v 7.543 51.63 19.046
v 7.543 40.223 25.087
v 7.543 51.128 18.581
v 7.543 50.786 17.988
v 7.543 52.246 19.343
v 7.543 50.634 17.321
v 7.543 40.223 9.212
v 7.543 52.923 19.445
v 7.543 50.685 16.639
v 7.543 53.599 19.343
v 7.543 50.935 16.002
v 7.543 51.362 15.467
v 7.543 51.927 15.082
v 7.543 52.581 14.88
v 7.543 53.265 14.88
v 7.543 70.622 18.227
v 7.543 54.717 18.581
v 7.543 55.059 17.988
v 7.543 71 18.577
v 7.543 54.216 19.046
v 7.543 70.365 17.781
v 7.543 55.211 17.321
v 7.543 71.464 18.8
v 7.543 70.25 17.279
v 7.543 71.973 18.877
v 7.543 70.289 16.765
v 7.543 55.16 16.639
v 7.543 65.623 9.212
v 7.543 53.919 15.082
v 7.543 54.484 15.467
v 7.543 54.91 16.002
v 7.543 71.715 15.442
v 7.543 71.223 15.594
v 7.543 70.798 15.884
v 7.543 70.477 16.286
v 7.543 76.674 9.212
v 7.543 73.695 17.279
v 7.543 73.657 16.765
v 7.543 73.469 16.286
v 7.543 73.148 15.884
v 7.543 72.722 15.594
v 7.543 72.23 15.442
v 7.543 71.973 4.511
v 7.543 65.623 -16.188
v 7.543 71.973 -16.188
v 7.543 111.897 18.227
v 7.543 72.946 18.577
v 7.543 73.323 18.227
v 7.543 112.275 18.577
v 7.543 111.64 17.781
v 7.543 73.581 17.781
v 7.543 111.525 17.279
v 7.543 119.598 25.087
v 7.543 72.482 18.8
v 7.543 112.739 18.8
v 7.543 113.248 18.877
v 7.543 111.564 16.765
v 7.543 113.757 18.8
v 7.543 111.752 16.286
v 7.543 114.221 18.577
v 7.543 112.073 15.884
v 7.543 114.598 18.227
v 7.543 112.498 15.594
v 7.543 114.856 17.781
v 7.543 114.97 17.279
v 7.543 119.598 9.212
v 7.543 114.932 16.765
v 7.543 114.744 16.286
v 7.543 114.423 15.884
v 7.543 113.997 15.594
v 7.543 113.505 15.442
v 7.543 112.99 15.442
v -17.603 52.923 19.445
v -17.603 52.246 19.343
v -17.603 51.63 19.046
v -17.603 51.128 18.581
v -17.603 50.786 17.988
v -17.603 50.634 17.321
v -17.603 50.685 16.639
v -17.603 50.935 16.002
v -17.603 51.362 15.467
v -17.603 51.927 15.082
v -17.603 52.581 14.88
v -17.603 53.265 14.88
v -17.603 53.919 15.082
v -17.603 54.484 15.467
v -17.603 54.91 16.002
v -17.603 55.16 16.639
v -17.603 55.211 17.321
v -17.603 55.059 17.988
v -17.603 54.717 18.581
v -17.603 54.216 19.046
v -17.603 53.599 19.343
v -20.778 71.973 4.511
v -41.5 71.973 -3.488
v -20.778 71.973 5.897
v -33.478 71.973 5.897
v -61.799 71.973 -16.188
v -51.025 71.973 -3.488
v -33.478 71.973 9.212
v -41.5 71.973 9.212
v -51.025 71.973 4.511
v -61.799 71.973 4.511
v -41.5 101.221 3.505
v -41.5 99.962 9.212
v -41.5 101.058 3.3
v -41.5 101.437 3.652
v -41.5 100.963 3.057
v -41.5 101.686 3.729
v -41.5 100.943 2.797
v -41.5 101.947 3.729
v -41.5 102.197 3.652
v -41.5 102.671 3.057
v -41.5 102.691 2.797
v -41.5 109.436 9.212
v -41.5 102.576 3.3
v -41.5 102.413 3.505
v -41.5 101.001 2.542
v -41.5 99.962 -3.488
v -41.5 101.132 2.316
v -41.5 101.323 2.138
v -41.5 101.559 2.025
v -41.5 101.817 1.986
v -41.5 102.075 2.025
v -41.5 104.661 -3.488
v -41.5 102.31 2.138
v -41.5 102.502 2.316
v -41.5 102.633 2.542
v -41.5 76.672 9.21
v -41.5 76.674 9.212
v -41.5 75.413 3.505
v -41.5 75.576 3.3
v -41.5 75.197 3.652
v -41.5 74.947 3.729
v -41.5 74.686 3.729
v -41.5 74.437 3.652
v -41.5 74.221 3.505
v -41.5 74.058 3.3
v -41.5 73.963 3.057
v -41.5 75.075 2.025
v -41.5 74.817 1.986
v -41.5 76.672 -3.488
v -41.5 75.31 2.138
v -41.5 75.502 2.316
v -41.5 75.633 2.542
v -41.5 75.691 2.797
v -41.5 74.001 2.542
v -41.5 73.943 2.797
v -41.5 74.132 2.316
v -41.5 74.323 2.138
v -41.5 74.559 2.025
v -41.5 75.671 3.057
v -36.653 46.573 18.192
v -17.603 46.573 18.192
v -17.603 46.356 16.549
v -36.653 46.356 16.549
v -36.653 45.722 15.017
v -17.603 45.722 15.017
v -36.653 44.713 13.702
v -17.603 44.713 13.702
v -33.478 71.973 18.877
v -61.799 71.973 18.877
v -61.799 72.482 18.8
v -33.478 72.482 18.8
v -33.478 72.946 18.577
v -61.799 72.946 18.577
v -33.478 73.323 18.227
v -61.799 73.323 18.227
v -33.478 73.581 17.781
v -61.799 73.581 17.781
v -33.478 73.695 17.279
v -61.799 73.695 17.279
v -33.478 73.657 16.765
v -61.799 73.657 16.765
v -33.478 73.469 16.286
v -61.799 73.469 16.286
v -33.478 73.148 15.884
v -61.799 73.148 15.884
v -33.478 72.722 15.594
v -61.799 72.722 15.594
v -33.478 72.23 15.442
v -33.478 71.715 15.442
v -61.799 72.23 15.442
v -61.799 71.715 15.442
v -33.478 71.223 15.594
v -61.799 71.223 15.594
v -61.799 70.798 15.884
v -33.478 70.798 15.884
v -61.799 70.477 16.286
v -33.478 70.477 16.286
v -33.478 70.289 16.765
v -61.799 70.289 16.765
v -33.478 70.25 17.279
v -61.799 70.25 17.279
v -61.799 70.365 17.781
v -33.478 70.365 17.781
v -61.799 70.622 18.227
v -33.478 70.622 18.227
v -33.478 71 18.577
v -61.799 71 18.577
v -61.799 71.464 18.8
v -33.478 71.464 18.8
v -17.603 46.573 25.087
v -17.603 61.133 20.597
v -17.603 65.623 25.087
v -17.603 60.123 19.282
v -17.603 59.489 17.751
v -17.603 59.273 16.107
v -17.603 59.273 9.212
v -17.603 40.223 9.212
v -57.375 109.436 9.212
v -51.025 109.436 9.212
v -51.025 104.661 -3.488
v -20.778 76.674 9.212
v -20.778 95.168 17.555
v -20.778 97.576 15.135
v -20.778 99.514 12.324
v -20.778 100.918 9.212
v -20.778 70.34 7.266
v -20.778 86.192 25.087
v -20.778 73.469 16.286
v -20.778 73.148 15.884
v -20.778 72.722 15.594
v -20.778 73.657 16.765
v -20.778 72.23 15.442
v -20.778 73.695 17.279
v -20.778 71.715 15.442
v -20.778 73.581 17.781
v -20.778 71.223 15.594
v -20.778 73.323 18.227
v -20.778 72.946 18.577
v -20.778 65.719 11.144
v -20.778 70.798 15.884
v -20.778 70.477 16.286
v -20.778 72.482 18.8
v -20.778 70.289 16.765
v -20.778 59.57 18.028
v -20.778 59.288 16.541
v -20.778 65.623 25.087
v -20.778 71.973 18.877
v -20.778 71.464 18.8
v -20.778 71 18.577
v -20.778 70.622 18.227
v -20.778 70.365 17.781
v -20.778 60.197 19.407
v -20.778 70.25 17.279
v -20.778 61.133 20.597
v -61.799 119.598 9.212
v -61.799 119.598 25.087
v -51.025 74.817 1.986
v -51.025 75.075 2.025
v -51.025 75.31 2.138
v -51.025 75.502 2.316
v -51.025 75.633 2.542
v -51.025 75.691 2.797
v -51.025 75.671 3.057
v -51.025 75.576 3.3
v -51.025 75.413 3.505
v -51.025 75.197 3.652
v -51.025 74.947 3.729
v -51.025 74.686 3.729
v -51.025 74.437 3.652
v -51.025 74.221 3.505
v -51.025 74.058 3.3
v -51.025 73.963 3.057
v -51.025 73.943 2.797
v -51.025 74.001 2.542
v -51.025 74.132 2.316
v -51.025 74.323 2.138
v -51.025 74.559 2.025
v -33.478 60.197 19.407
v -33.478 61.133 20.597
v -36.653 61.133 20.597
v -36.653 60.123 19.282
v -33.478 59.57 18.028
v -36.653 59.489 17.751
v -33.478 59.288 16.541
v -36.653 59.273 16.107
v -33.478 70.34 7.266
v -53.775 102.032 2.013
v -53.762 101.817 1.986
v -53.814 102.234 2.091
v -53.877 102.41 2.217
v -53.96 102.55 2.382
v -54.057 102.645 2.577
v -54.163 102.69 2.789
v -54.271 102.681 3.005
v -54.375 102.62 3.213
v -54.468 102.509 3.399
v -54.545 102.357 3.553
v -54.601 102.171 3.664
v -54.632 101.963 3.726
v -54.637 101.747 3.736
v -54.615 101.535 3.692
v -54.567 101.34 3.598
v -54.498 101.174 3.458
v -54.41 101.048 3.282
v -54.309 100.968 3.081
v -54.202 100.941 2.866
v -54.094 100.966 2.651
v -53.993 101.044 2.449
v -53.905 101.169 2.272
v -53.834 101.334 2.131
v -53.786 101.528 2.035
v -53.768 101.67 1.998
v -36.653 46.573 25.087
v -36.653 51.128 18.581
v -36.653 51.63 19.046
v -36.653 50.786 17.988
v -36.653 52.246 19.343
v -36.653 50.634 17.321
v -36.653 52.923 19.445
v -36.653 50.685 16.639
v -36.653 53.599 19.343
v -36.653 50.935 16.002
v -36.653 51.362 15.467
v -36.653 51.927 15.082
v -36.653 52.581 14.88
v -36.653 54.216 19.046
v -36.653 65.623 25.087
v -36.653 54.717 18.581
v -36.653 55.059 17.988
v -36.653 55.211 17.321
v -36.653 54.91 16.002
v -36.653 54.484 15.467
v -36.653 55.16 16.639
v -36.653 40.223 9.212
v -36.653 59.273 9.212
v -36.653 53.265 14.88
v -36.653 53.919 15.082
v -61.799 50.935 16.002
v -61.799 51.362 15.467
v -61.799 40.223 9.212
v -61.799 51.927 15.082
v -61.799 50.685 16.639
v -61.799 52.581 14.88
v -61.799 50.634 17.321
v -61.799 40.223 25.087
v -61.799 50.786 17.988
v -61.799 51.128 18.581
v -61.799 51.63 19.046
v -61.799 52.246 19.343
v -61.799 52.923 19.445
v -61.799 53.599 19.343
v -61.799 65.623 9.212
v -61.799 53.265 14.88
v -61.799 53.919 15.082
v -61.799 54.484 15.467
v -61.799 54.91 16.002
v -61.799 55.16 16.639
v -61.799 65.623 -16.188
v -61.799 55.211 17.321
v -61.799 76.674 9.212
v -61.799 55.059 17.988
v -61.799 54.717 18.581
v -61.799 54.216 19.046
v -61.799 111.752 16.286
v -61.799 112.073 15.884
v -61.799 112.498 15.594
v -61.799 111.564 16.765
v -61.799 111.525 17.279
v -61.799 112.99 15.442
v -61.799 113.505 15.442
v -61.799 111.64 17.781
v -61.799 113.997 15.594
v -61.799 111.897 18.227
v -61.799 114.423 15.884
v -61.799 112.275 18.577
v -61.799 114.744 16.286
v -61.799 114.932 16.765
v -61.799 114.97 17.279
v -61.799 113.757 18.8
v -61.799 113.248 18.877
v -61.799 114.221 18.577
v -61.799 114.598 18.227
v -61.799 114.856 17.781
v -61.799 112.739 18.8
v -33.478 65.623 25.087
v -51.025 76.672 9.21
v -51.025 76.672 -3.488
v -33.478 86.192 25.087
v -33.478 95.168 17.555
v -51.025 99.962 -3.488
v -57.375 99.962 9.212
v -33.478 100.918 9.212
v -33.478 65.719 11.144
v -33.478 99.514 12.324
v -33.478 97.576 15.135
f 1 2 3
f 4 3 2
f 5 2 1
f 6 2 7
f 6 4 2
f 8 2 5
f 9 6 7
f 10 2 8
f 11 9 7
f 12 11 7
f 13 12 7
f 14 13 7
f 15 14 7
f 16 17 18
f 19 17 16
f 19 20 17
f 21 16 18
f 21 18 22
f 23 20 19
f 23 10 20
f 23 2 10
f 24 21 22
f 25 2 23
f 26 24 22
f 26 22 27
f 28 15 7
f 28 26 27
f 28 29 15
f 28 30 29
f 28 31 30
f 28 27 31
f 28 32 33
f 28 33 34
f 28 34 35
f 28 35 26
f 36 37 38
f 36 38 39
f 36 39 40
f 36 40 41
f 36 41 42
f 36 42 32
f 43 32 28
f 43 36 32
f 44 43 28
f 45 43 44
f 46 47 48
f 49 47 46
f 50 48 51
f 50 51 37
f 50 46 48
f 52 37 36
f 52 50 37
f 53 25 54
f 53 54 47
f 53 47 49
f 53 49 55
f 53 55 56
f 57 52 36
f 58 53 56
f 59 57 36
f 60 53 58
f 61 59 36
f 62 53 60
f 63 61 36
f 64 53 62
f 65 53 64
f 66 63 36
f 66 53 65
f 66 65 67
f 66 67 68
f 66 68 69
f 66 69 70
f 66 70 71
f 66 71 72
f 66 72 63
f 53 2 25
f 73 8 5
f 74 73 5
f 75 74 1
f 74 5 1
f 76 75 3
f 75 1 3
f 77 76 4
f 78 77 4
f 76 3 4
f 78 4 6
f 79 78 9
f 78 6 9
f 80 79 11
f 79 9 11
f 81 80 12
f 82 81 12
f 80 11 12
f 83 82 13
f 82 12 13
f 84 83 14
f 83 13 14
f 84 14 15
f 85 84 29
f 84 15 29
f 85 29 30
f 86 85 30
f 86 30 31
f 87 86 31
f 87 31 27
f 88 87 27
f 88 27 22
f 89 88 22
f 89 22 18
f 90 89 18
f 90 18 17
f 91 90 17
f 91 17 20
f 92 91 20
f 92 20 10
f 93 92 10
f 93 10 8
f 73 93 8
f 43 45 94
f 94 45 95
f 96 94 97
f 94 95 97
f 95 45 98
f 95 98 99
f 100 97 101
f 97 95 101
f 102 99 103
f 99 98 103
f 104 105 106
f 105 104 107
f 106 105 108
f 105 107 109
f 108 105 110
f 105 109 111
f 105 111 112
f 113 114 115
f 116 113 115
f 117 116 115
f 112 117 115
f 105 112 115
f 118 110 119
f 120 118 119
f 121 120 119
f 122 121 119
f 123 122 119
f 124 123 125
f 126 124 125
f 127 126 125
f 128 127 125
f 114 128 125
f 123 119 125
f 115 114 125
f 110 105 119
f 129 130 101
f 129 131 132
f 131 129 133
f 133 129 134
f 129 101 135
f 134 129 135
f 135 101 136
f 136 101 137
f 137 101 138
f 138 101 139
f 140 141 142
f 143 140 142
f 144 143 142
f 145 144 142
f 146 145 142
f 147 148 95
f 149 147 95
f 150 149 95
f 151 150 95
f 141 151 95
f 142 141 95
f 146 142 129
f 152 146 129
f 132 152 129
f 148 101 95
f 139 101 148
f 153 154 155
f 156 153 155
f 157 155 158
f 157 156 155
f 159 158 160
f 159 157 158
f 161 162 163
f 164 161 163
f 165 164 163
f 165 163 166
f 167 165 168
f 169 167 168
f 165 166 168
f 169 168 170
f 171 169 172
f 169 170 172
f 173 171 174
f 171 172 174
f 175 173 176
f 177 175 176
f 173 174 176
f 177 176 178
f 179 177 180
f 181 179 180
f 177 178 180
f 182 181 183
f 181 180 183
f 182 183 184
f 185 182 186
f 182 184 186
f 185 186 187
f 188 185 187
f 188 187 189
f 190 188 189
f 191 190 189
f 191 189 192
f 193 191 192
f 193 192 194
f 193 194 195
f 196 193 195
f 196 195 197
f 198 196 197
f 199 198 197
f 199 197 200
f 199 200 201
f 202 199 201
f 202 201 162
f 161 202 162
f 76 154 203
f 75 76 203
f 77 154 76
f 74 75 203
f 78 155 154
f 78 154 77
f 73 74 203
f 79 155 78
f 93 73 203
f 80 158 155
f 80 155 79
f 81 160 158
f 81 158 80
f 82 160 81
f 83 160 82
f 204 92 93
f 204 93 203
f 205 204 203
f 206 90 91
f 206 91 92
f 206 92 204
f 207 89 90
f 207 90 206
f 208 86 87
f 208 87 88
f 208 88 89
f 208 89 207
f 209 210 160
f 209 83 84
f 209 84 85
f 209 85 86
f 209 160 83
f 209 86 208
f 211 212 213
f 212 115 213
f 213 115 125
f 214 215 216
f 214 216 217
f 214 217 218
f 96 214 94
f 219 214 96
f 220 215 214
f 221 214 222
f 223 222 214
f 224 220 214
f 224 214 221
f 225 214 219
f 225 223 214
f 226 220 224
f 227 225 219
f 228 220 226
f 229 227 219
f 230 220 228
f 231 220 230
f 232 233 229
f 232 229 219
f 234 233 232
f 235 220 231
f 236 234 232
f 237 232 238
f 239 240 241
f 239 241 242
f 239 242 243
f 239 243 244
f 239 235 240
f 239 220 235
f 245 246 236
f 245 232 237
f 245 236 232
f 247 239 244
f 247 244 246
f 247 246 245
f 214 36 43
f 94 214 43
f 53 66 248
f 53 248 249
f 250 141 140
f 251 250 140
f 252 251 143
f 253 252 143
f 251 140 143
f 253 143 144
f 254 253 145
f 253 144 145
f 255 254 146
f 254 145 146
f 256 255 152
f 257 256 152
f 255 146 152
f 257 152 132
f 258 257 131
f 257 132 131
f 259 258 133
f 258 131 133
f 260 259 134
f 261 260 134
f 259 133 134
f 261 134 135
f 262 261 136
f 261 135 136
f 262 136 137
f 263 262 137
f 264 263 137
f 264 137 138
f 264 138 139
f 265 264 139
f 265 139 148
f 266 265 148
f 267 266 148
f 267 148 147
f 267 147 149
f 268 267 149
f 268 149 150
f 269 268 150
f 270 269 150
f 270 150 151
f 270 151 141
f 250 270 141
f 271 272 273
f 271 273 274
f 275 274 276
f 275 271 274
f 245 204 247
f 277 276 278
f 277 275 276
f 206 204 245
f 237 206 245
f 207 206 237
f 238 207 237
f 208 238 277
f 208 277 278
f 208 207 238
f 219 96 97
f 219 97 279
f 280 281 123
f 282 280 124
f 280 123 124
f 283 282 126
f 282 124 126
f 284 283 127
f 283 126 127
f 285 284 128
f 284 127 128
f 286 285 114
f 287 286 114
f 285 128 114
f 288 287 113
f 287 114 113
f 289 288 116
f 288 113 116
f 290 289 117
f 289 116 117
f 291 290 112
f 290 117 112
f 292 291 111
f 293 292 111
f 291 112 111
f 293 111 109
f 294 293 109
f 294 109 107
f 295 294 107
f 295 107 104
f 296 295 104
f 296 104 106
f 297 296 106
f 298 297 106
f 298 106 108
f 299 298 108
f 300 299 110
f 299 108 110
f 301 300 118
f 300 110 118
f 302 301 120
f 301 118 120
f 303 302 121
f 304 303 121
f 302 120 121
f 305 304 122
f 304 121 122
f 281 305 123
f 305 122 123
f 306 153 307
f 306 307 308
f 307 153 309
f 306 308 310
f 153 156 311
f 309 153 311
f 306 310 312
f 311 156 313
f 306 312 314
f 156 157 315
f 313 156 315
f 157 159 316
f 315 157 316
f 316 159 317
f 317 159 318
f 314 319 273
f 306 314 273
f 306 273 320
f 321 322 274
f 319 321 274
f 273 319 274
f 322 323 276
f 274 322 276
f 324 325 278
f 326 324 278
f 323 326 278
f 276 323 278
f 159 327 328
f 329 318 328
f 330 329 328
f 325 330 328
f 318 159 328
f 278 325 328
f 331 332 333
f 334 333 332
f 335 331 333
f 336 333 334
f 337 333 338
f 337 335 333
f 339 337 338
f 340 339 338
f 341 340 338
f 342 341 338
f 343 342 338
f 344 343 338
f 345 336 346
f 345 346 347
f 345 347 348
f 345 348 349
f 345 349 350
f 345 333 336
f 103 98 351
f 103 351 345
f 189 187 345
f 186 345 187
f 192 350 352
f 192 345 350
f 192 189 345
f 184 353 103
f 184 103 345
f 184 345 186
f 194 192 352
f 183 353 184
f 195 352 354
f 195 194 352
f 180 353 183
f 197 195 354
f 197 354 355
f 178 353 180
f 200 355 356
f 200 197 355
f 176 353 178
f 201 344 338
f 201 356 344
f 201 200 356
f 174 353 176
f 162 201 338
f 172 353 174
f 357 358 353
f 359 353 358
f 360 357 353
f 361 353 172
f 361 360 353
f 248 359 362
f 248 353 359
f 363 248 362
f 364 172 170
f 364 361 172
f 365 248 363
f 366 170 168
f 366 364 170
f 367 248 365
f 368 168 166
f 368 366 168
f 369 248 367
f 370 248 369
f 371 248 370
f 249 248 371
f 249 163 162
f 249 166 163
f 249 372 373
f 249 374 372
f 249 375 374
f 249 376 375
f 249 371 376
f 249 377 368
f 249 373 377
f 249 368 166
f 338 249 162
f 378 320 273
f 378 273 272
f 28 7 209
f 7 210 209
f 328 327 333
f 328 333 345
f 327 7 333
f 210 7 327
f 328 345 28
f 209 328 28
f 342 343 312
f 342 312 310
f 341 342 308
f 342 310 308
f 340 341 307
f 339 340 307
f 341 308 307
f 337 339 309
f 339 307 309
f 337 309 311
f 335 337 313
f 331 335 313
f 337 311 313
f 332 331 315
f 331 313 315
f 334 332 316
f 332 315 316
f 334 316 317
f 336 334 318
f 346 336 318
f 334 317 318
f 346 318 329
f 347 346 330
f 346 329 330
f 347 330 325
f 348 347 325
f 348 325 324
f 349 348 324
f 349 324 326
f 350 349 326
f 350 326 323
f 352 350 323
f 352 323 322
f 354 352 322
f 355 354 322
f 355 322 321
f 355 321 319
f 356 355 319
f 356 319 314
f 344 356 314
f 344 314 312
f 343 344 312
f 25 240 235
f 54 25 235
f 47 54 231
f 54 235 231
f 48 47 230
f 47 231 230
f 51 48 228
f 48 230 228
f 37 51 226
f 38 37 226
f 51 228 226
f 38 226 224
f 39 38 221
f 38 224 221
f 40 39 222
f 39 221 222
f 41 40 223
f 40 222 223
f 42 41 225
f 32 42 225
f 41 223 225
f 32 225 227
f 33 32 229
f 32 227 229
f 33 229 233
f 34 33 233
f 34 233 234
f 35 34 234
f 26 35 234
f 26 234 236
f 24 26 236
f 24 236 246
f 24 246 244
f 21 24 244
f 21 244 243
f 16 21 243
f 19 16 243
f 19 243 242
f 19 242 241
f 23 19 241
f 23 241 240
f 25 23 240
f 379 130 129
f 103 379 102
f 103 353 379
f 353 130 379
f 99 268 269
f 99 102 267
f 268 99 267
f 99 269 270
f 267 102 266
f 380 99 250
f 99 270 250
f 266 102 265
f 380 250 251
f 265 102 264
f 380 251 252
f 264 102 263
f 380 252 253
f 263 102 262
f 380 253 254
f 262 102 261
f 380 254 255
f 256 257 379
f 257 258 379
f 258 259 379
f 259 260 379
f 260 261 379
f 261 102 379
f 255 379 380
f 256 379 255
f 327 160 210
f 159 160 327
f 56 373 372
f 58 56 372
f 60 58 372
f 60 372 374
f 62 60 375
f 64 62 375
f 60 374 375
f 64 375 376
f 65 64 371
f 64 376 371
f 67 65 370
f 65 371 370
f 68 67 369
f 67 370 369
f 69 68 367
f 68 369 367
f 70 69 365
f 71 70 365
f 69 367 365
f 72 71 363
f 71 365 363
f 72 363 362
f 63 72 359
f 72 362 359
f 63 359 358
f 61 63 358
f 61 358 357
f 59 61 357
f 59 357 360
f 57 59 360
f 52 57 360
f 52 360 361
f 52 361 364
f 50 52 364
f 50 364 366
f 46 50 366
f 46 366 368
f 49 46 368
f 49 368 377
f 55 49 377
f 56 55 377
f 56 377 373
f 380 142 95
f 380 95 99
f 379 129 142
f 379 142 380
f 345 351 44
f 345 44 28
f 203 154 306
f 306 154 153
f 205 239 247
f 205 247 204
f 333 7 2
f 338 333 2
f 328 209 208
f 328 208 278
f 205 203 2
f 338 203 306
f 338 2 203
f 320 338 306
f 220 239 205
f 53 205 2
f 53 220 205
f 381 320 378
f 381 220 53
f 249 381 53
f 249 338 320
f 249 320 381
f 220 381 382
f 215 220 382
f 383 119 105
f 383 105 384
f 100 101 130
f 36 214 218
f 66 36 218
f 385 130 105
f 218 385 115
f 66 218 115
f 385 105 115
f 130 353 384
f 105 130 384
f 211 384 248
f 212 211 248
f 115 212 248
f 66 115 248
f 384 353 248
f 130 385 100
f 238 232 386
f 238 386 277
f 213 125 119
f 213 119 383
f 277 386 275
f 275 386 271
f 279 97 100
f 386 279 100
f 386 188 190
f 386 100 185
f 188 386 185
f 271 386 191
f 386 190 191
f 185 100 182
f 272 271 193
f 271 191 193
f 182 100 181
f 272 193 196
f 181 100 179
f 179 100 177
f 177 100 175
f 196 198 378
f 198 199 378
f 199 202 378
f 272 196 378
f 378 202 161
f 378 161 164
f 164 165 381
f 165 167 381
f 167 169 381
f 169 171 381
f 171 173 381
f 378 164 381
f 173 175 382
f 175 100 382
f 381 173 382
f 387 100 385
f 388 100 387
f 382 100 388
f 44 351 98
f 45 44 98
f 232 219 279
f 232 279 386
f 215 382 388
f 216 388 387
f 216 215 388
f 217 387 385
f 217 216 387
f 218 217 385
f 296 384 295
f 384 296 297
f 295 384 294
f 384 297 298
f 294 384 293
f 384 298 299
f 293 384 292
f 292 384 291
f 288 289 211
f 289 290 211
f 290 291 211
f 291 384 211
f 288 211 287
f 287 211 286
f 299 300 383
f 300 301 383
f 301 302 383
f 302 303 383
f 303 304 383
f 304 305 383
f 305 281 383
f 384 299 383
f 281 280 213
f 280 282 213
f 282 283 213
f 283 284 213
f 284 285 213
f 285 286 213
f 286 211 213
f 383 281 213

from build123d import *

# Parameters (mm, degrees)
SKETCH2_W               = 15.875
SKETCH2_H               = 79.375
SKETCH2_R               = 1.7272
SKETCH2_W_2             = 25.4
SKETCH2_H_2             = 6.35
BOSS_EXTRUDE1_DEPTH     = 69.85
SKETCH3_W               = 19.05
SKETCH3_H               = 12.7
CUT_EXTRUDE1_DEPTH      = 127
SKETCH4_R               = 2.2950679
CUT_EXTRUDE2_DEPTH      = 127
CHAMFER1_SIZE           = 6.35
FILLET2_R               = 6.35
CUT_EXTRUDE3_DEPTH      = 6.35
CUT_EXTRUDE3_DEPTH_BACK = 6.35
SKETCH8_R               = 2.4
SKETCH10_W              = 9.525
SKETCH10_H              = 4.699
BOSS_EXTRUDE2_DEPTH     = 12.7
SKETCH12_R              = 0.8763
CUT_EXTRUDE4_DEPTH      = 132.769283049
CHAMFER2_SIZE           = 4.7752
CHAMFER2_SIZE_2         = 12.7
CHAMFER3_SIZE           = 4.70154
CHAMFER4_SIZE           = 6.35
CHAMFER4_SIZE_2         = 12.7
CUT_EXTRUDE5_DEPTH      = 0.254
CUT_EXTRUDE6_DEPTH      = 0.254


# Some blends are built 0.0001 mm under size
with BuildPart() as part:
    # Sketch2 → Boss-Extrude1 (new body)
    # profile 1 of 2: a face of its own
    with BuildSketch(Plane.ZY.offset(62.053242547)):
        with Locations((17.149745439, 79.910239505)):
            Rectangle(SKETCH2_W, SKETCH2_H)
        with Locations((17.149745439, 113.247739505)):
            Circle(SKETCH2_R, mode=Mode.SUBTRACT)
        with Locations((17.149745439, 71.972739505)):
            Circle(SKETCH2_R, mode=Mode.SUBTRACT)
    # profile 2 of 2: a face of its own
    with BuildSketch(Plane.ZY.offset(62.053242547)):
        with Locations((-3.487754561, 68.797739505)):
            Rectangle(SKETCH2_W_2, SKETCH2_H_2)
    extrude(amount=-BOSS_EXTRUDE1_DEPTH)

    # Sketch3 → Cut-Extrude1 (cut)
    with BuildSketch(Plane(origin=(0, 0, 9.212245439), x_dir=(-1, 0, 0), z_dir=(0, 0, -1))):
        with Locations((27.128242547, 52.922739505)):
            Rectangle(SKETCH3_W, SKETCH3_H)
    extrude(amount=-CUT_EXTRUDE1_DEPTH, mode=Mode.SUBTRACT)

    # Sketch4 → Cut-Extrude2 (cut)
    with BuildSketch(Plane(origin=(7.796757453, 0, 0), x_dir=(0, 0, -1), z_dir=(1, 0, 0))):
        with Locations(Location((-17.149745439, 52.922739505, 0), (0, 0, 180))):
            Circle(SKETCH4_R)
    extrude(amount=-CUT_EXTRUDE2_DEPTH, mode=Mode.SUBTRACT)

    # Chamfer1
    chamfer1_edges = [part.edges().sort_by_distance(p)[0] for p in [
        (-27.128242547, 59.272739505, 25.087245439),
        (-27.128242547, 46.572739505, 9.212245439),
    ]]
    chamfer(chamfer1_edges, length=CHAMFER1_SIZE - 0.0001)  # a hair under: the kernel refuses the full size

    # Fillet2
    fillet2_edges = [part.edges().sort_by_distance(p)[0] for p in [
        (-27.128242547, 59.272739505, 18.737345439),
        (-27.128242547, 46.572739505, 15.562145439),
    ]]
    fillet(fillet2_edges, radius=FILLET2_R)

    # Sketch8 → Cut-Extrude3 (cut, two sides: drawn at the far end of the back side and taken through both)
    # profile 1 of 5: a face of its own
    with BuildSketch(Plane(origin=(-27.128242547, 59.272739505, 33.482952844), x_dir=(0, 0, 1), z_dir=(-1, 0, 0)).offset(-CUT_EXTRUDE3_DEPTH_BACK)):
        with BuildLine():
            Line((-7.077924175, -7.789561181), (-20.085542155, 7.712314277))
            ThreePointArc((-20.085542155, 7.712314277), (-21.190808514, 7.041102183), (-22.339064084, 6.446418612))
            Line((-22.339064084, 6.446418612), (-9.023677061, -9.422241709))
            Line((-9.023677061, -9.422241709), (-7.077924175, -7.789561181))
        make_face()
    # profile 2 of 5: a face of its own
    with BuildSketch(Plane(origin=(-27.128242547, 59.272739505, 33.482952844), x_dir=(0, 0, 1), z_dir=(-1, 0, 0)).offset(-CUT_EXTRUDE3_DEPTH_BACK)):
        with BuildLine():
            Line((-20.085542155, 7.712314277), (-24.270707405, 12.7))
            Line((-24.270707405, 12.7), (-26.21646029, 11.067319471))
            Line((-26.21646029, 11.067319471), (-22.339064084, 6.446418612))
            ThreePointArc((-22.339064084, 6.446418612), (-21.190808514, 7.041102183), (-20.085542155, 7.712314277))
        make_face()
    # profile 3 of 5: a face of its own
    with BuildSketch(Plane(origin=(-27.128242547, 59.272739505, 33.482952844), x_dir=(0, 0, 1), z_dir=(-1, 0, 0)).offset(-CUT_EXTRUDE3_DEPTH_BACK)):
        Polygon((-26.21646029, 11.067319471), (-24.270707405, 12.7), (-27.58644192, 12.7), align=None)
    # profile 4 of 5: a face of its own
    with BuildSketch(Plane(origin=(-27.128242547, 59.272739505, 33.482952844), x_dir=(0, 0, 1), z_dir=(-1, 0, 0)).offset(-CUT_EXTRUDE3_DEPTH_BACK)):
        with BuildLine():
            ThreePointArc((-11.470707405, 23.65), (-13.762240918, 14.591506693), (-20.085542155, 7.712314277))
            Line((-20.085542155, 7.712314277), (-7.077924175, -7.789561181))
            Line((-7.077924175, -7.789561181), (9.239394359, 5.902294783))
            Line((9.239394359, 5.902294783), (-15.927560764, 35.895103965))
            ThreePointArc((-15.927560764, 35.895103965), (-12.619562979, 30.16548373), (-11.470707405, 23.65))
        make_face()
    # profile 5 of 5: a face of its own
    with BuildSketch(Plane(origin=(-27.128242547, 59.272739505, 33.482952844), x_dir=(0, 0, 1), z_dir=(-1, 0, 0)).offset(-CUT_EXTRUDE3_DEPTH_BACK)):
        with BuildLine():
            Line((-27.58644192, 12.7), (-24.270707405, 12.7))
            Line((-24.270707405, 12.7), (-20.085542155, 7.712314277))
            ThreePointArc((-20.085542155, 7.712314277), (-13.762240918, 14.591506693), (-11.470707405, 23.65))
            ThreePointArc((-11.470707405, 23.65), (-12.619562979, 30.16548373), (-15.927560764, 35.895103965))
            ThreePointArc((-15.927560764, 35.895103965), (-42.128931765, 38.754688915), (-46.109164673, 12.7))
            Line((-46.109164673, 12.7), (-27.58644192, 12.7))
        make_face()
        with Locations((-30.520707405, 23.65)):
            Circle(SKETCH8_R, mode=Mode.SUBTRACT)
    extrude(amount=CUT_EXTRUDE3_DEPTH + CUT_EXTRUDE3_DEPTH_BACK, mode=Mode.SUBTRACT)

    # Sketch10 → Boss-Extrude2 (add)
    with BuildSketch(Plane(origin=(0, 0, 9.212245439), x_dir=(-1, 0, 0), z_dir=(0, 0, -1))):
        with Locations((46.262342601, 74.322239505)):
            Rectangle(SKETCH10_W, SKETCH10_H)
        with Locations((46.262342601, 102.311439505)):
            Rectangle(SKETCH10_W, SKETCH10_H)
    extrude(amount=BOSS_EXTRUDE2_DEPTH)

    # Sketch12 → Cut-Extrude4 (cut, through all)
    with BuildSketch(Plane(origin=(-41.499842601, 0, 0), x_dir=(0, 0, -1), z_dir=(1, 0, 0))):
        with Locations((-2.862245439, 101.816839505)):
            Circle(SKETCH12_R)
        with Locations((-2.862245439, 74.816839505)):
            Circle(SKETCH12_R)
    extrude(amount=-CUT_EXTRUDE4_DEPTH, mode=Mode.SUBTRACT)

    # Chamfer2
    # the kernel refuses this chamfer: 12.7, 4.7752 mm, written as the material it adds along each edge
    with BuildSketch(Plane(origin=(-41.499842601, 104.660939505, 9.212245439), x_dir=(0, 0.9954252149618871, 0.09554392402492679), z_dir=(-1, 0, 0))) as chamfer2_piece_1:
        Polygon((CHAMFER2_SIZE * 0.995425214962, CHAMFER2_SIZE * 0.0955439240249), (-CHAMFER2_SIZE_2 * 0.0955439240249, CHAMFER2_SIZE_2 * 0.995425214962), (0, 0), align=None)
    extrude(amount=9.525)

    # Chamfer3
    # the kernel refuses this chamfer: 4.70154 mm, written as the material it adds along each edge
    with BuildSketch(Plane(origin=(-62.053242547, 71.972739505, 9.212245439), x_dir=(0, 0.9996219169112968, 0.02749587661058452), z_dir=(1, 0, 0))) as chamfer3_piece_1_section:
        Polygon((CHAMFER3_SIZE * 0.999621916911, -CHAMFER3_SIZE * 0.0274958766106), (-CHAMFER3_SIZE * 0.0274958766106, -CHAMFER3_SIZE * 0.999621916911), (0, 0), align=None)
    chamfer3_piece_1 = extrude(amount=23.119270381, mode=Mode.PRIVATE)
    chamfer3_piece_1 = split(chamfer3_piece_1, bisect_by=Plane(origin=(-41.499842601, 76.672586172, 9.211398772), z_dir=(-1, 0, 0)), keep=Keep.TOP, mode=Mode.PRIVATE)
    add(chamfer3_piece_1)
    with BuildSketch(Plane(origin=(-20.778242547, 71.972739505, 9.212245439), x_dir=(0, 0.9996219169112968, 0.02749587661058452), z_dir=(1, 0, 0))) as chamfer3_piece_2:
        Polygon((CHAMFER3_SIZE * 0.999621916911, -CHAMFER3_SIZE * 0.0274958766106), (-CHAMFER3_SIZE * 0.0274958766106, -CHAMFER3_SIZE * 0.999621916911), (0, 0), align=None)
    extrude(amount=28.575)

    # Chamfer4
    # the kernel refuses this chamfer: 12.7, 6.35 mm, written as the material it adds along each edge
    with BuildSketch(Plane(origin=(-51.024842601, 142.326966202, 9.212245439), x_dir=(-0.9976223042390326, -2.633779610739709e-14, 0.06891834360170875), z_dir=(0, -1, 0))) as chamfer4_piece_1_section:
        Polygon((CHAMFER4_SIZE * 0.997622304239, CHAMFER4_SIZE * 0.0689183436017), (-CHAMFER4_SIZE_2 * 0.0689183436017, CHAMFER4_SIZE_2 * 0.997622304239), (0, 0), align=None)
    chamfer4_piece_1 = extrude(amount=42.365026697, mode=Mode.PRIVATE)
    chamfer4_piece_1 = split(chamfer4_piece_1, bisect_by=Plane(origin=(-53.26388473, 107.534062678, 4.153530473), z_dir=(0, -0.9360210850035494, 0.35194392796122825)), keep=Keep.TOP, mode=Mode.PRIVATE)
    chamfer4_piece_1 = chamfer4_piece_1 - Plane(origin=(-53.26388473, 101.816839505, 2.862245439), x_dir=(0, 0, -1), z_dir=(1, 0, 0)) * Cylinder(0.8763, 136, mode=Mode.PRIVATE)
    add(chamfer4_piece_1)

    # Sketch13 → Cut-Extrude5 (cut)
    with BuildSketch(Plane(origin=(7.796757453, 0, 0), x_dir=(0, 0, -1), z_dir=(1, 0, 0))):
        Polygon((16.187754561, 65.622739505), (16.187754561, 71.972739505), (-4.510705439, 71.972739505), (-9.212245439, 76.674279505), (-9.212245439, 119.597739505), (-25.087245439, 119.597739505), (-25.087245439, 40.222739505), (-9.212245439, 40.222739505), (-9.212245439, 65.622739505), align=None)
    extrude(amount=-CUT_EXTRUDE5_DEPTH, mode=Mode.SUBTRACT)

    # Sketch14 → Cut-Extrude6 (cut)
    with BuildSketch(Plane.ZY.offset(62.053242547)):
        Polygon((-16.187754561, 71.972739505), (-16.187754561, 65.622739505), (9.212245439, 65.622739505), (9.212245439, 40.222739505), (25.087245439, 40.222739505), (25.087245439, 119.597739505), (9.212245439, 119.597739505), (9.212245439, 76.674279505), (4.510705439, 71.972739505), align=None)
    extrude(amount=-CUT_EXTRUDE6_DEPTH, mode=Mode.SUBTRACT)


solid = part.part
